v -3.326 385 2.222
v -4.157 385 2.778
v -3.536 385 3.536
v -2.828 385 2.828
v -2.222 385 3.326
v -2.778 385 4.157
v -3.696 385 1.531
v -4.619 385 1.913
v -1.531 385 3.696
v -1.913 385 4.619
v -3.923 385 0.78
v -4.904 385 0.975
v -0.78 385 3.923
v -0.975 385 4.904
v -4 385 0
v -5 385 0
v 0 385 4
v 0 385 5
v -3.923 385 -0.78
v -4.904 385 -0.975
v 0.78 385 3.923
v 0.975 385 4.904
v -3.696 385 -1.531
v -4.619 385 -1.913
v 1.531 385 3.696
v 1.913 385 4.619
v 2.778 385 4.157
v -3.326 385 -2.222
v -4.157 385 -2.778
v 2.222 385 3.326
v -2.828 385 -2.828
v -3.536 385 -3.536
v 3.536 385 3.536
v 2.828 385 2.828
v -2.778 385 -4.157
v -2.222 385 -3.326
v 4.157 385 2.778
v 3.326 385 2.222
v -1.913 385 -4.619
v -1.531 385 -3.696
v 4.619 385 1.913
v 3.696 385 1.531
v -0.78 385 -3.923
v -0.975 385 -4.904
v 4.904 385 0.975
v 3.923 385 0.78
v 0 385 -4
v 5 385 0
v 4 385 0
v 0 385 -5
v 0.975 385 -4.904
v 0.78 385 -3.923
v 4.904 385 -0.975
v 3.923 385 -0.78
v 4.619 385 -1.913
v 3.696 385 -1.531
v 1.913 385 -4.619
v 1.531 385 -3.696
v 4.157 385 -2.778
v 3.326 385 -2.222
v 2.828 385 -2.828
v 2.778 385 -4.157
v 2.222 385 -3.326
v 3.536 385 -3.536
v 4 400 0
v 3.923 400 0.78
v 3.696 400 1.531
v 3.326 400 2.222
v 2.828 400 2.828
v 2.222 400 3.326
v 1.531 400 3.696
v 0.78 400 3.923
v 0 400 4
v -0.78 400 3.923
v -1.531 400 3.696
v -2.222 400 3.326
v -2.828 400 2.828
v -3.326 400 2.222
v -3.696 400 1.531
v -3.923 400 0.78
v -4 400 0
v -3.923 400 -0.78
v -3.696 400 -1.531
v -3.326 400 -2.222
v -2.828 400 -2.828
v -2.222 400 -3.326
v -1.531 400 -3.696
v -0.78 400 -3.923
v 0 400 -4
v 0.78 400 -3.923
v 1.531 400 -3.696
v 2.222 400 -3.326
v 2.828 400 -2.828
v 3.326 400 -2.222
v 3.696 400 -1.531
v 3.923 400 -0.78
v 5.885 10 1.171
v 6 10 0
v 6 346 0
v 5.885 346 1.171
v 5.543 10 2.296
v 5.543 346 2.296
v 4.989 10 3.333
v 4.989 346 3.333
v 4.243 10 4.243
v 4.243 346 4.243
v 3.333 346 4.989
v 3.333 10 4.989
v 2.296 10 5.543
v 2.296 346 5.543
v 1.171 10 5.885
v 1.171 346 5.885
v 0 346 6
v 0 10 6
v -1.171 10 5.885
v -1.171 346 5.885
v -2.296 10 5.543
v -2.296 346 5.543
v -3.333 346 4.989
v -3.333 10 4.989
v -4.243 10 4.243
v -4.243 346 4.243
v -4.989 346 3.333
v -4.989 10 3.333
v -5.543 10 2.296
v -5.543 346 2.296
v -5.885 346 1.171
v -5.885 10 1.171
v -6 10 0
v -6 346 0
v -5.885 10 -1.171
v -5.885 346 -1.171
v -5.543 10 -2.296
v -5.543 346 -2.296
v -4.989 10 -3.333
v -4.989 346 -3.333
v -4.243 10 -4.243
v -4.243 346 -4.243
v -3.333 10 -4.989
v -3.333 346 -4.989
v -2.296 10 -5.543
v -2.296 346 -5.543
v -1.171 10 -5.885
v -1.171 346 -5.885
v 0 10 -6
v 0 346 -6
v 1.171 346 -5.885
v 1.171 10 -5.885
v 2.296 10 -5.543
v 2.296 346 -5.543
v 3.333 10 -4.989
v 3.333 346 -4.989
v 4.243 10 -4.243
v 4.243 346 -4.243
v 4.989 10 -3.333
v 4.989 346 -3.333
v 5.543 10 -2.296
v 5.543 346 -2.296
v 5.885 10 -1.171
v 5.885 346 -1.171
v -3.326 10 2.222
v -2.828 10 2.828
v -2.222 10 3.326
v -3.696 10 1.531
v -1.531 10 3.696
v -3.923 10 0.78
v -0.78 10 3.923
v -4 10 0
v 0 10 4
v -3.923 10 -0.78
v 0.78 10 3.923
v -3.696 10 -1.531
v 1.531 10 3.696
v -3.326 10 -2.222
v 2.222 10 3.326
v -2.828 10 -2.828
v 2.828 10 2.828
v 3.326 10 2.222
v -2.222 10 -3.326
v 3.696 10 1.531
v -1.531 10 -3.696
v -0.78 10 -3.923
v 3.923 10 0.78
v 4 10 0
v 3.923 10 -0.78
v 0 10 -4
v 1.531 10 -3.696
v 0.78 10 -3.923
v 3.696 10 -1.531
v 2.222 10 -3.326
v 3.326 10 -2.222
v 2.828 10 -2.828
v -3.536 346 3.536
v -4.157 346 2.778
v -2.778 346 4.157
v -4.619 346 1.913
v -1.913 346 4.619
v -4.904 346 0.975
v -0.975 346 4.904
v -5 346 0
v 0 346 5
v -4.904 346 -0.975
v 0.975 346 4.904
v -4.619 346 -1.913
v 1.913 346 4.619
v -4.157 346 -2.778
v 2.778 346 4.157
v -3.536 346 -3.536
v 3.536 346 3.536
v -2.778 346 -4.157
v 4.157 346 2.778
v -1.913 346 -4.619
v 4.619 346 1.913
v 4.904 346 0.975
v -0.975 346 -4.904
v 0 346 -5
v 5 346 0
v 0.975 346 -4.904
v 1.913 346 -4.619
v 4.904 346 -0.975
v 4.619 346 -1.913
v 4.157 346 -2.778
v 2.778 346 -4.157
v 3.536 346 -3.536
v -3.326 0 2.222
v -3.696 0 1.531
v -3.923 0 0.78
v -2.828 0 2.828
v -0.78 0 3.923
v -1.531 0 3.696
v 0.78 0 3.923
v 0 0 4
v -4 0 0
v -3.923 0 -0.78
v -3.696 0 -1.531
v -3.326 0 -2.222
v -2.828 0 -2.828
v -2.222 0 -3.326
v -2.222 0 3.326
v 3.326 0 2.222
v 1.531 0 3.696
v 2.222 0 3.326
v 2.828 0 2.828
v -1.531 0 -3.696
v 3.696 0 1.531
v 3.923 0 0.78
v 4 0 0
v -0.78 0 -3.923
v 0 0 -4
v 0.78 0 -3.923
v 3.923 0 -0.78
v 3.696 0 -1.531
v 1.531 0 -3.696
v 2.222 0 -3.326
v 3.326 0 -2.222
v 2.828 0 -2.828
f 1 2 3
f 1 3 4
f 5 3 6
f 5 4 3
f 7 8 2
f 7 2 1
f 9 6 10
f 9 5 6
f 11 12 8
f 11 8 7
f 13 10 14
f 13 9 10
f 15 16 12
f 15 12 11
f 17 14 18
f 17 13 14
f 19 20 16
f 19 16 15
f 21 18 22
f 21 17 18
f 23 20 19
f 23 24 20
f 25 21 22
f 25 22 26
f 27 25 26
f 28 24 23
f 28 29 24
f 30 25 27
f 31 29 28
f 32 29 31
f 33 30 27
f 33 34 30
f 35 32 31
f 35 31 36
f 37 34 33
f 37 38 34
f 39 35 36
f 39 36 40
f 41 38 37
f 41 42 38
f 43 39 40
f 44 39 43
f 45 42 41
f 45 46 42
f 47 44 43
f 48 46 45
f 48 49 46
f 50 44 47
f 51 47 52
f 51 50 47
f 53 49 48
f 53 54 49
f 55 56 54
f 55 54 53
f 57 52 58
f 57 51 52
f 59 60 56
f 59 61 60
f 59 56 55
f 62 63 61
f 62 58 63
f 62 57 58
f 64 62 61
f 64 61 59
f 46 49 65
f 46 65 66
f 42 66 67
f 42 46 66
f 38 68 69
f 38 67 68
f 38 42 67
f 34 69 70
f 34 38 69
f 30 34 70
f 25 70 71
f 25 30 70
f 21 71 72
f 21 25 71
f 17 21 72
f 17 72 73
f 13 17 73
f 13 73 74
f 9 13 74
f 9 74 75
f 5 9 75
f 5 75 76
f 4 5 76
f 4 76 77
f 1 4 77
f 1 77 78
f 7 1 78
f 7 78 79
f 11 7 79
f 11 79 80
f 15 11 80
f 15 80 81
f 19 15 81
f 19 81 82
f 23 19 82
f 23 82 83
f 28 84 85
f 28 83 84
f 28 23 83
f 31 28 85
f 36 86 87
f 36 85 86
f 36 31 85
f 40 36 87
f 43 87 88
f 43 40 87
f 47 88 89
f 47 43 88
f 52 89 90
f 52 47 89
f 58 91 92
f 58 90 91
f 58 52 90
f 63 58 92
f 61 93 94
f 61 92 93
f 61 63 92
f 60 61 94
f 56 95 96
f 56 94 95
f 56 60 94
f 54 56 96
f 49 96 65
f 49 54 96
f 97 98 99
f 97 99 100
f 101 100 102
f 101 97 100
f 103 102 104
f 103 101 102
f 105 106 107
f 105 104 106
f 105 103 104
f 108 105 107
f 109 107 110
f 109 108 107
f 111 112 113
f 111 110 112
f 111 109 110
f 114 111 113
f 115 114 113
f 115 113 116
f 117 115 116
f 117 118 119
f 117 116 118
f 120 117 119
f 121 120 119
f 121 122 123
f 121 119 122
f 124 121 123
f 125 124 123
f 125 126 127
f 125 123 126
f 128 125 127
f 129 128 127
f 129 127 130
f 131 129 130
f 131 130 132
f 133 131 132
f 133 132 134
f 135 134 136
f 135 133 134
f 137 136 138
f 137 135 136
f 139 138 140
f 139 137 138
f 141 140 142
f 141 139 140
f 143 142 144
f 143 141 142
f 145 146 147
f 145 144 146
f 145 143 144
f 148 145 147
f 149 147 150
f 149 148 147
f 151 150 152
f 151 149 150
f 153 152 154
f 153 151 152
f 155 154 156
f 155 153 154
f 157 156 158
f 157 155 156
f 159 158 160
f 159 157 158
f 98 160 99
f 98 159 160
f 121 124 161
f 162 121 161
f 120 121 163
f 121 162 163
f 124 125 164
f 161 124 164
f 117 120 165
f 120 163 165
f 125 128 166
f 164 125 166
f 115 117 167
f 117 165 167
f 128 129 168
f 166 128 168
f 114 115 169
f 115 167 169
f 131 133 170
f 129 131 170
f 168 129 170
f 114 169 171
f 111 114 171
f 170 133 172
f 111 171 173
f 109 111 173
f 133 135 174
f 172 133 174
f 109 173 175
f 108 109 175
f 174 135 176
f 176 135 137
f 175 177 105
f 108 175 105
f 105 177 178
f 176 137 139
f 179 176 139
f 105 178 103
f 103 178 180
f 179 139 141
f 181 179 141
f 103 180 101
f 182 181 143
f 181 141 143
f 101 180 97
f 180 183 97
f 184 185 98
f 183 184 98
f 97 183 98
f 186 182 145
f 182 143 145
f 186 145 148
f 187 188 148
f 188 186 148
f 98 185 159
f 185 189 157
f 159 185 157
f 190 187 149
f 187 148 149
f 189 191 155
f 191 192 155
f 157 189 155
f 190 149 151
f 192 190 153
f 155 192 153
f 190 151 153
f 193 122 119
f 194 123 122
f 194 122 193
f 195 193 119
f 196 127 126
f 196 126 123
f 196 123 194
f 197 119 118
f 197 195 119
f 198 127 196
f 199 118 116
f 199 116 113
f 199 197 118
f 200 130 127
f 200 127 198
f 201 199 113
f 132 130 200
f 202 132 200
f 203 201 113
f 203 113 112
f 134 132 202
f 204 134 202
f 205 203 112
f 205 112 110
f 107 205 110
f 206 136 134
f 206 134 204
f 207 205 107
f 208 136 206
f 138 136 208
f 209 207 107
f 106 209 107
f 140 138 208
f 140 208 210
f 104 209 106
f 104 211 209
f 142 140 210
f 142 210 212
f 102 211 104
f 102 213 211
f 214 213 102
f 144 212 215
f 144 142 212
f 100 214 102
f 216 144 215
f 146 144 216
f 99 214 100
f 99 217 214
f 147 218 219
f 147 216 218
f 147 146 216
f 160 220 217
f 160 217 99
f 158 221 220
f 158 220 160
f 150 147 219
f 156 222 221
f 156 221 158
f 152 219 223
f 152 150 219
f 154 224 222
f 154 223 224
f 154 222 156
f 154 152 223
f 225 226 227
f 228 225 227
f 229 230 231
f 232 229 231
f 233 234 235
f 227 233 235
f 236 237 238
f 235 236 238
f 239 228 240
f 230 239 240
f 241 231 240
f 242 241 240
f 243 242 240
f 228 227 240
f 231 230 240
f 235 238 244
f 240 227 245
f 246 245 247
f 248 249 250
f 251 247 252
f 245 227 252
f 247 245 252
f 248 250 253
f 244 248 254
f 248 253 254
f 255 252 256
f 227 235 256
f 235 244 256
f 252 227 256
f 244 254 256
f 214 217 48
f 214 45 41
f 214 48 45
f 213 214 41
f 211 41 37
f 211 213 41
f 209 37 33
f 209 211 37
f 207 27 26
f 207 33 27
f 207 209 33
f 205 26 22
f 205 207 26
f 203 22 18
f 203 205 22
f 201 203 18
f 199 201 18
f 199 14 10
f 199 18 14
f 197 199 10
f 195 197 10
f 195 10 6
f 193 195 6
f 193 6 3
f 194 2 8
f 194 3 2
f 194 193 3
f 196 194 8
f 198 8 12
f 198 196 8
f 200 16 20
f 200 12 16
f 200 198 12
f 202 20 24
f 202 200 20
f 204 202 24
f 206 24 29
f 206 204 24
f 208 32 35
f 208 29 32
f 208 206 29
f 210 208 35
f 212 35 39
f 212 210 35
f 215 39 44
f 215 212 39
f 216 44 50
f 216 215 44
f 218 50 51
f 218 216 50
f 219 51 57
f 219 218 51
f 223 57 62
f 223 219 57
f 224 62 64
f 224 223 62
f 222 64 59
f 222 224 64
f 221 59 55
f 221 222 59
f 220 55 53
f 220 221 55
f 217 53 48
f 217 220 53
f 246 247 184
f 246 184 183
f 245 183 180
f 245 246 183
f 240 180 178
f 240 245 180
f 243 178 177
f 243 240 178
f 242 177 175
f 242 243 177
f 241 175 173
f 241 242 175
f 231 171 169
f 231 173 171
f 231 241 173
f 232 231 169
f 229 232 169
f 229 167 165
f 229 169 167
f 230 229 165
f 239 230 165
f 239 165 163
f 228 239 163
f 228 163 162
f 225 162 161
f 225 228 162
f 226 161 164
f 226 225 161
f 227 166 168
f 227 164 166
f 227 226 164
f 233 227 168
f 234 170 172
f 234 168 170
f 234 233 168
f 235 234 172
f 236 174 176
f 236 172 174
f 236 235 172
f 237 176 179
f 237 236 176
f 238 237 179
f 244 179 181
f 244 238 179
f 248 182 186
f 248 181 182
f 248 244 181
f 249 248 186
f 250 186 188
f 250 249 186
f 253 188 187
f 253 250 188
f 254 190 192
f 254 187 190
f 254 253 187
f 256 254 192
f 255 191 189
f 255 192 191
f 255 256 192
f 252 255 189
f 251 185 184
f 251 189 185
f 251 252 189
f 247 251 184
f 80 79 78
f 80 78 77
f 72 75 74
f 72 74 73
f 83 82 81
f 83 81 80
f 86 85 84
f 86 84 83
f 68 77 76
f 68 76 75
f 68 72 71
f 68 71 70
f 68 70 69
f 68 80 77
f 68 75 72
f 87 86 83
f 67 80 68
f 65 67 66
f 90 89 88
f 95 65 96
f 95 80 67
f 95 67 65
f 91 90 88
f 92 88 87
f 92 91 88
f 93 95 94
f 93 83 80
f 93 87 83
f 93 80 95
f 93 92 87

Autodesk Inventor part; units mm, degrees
ref_plane "YZ Plane" through (0, 0, 0) normal (1, 0, 0) x (0, 1, 0)
ref_plane "XZ Plane" through (0, 0, 0) normal (0, 1, 0) x (-1, 0, 0)
ref_plane "XY Plane" through (0, 0, 0) normal (0, 0, 1) x (1, 0, 0)
sketch "Sketch1" plane through (0, 0, 0) normal (0, 0, 1) x (1, 0, 0)
  line L0 (0, 0) -> (0, 400)
  line L1 (0, 400) -> (4, 400)
  line L2 (4, 400) -> (4, 385)
  line L3 (4, 385) -> (5, 385)
  line L4 (5, 385) -> (5, 346)
  line L5 (5, 346) -> (6, 346)
  line L6 (6, 346) -> (6, 10)
  line L7 (6, 10) -> (4, 10)
  line L8 (4, 10) -> (4, 0)
  line L9 (4, 0) -> (0, 0)
  dimension "d0" = 400
  dimension "d1" = 8
  dimension "d2" = 10
  dimension "d3" = 12
  dimension "d4" = 10
  dimension "d5" = 8
  dimension "d6" = 15
  dimension "d7" = 39
revolve "Revolution1" add sketch "Sketch1" angle 360 about axis through (0, 0, 0) along (0, 1, 0)
thread "Thread1" size "TR12x2" class "7e" standard "ISO Metric Trapezoidal Threads" full length
properties part number "Z Axis Ball Screw" material "Stainless Steel"
